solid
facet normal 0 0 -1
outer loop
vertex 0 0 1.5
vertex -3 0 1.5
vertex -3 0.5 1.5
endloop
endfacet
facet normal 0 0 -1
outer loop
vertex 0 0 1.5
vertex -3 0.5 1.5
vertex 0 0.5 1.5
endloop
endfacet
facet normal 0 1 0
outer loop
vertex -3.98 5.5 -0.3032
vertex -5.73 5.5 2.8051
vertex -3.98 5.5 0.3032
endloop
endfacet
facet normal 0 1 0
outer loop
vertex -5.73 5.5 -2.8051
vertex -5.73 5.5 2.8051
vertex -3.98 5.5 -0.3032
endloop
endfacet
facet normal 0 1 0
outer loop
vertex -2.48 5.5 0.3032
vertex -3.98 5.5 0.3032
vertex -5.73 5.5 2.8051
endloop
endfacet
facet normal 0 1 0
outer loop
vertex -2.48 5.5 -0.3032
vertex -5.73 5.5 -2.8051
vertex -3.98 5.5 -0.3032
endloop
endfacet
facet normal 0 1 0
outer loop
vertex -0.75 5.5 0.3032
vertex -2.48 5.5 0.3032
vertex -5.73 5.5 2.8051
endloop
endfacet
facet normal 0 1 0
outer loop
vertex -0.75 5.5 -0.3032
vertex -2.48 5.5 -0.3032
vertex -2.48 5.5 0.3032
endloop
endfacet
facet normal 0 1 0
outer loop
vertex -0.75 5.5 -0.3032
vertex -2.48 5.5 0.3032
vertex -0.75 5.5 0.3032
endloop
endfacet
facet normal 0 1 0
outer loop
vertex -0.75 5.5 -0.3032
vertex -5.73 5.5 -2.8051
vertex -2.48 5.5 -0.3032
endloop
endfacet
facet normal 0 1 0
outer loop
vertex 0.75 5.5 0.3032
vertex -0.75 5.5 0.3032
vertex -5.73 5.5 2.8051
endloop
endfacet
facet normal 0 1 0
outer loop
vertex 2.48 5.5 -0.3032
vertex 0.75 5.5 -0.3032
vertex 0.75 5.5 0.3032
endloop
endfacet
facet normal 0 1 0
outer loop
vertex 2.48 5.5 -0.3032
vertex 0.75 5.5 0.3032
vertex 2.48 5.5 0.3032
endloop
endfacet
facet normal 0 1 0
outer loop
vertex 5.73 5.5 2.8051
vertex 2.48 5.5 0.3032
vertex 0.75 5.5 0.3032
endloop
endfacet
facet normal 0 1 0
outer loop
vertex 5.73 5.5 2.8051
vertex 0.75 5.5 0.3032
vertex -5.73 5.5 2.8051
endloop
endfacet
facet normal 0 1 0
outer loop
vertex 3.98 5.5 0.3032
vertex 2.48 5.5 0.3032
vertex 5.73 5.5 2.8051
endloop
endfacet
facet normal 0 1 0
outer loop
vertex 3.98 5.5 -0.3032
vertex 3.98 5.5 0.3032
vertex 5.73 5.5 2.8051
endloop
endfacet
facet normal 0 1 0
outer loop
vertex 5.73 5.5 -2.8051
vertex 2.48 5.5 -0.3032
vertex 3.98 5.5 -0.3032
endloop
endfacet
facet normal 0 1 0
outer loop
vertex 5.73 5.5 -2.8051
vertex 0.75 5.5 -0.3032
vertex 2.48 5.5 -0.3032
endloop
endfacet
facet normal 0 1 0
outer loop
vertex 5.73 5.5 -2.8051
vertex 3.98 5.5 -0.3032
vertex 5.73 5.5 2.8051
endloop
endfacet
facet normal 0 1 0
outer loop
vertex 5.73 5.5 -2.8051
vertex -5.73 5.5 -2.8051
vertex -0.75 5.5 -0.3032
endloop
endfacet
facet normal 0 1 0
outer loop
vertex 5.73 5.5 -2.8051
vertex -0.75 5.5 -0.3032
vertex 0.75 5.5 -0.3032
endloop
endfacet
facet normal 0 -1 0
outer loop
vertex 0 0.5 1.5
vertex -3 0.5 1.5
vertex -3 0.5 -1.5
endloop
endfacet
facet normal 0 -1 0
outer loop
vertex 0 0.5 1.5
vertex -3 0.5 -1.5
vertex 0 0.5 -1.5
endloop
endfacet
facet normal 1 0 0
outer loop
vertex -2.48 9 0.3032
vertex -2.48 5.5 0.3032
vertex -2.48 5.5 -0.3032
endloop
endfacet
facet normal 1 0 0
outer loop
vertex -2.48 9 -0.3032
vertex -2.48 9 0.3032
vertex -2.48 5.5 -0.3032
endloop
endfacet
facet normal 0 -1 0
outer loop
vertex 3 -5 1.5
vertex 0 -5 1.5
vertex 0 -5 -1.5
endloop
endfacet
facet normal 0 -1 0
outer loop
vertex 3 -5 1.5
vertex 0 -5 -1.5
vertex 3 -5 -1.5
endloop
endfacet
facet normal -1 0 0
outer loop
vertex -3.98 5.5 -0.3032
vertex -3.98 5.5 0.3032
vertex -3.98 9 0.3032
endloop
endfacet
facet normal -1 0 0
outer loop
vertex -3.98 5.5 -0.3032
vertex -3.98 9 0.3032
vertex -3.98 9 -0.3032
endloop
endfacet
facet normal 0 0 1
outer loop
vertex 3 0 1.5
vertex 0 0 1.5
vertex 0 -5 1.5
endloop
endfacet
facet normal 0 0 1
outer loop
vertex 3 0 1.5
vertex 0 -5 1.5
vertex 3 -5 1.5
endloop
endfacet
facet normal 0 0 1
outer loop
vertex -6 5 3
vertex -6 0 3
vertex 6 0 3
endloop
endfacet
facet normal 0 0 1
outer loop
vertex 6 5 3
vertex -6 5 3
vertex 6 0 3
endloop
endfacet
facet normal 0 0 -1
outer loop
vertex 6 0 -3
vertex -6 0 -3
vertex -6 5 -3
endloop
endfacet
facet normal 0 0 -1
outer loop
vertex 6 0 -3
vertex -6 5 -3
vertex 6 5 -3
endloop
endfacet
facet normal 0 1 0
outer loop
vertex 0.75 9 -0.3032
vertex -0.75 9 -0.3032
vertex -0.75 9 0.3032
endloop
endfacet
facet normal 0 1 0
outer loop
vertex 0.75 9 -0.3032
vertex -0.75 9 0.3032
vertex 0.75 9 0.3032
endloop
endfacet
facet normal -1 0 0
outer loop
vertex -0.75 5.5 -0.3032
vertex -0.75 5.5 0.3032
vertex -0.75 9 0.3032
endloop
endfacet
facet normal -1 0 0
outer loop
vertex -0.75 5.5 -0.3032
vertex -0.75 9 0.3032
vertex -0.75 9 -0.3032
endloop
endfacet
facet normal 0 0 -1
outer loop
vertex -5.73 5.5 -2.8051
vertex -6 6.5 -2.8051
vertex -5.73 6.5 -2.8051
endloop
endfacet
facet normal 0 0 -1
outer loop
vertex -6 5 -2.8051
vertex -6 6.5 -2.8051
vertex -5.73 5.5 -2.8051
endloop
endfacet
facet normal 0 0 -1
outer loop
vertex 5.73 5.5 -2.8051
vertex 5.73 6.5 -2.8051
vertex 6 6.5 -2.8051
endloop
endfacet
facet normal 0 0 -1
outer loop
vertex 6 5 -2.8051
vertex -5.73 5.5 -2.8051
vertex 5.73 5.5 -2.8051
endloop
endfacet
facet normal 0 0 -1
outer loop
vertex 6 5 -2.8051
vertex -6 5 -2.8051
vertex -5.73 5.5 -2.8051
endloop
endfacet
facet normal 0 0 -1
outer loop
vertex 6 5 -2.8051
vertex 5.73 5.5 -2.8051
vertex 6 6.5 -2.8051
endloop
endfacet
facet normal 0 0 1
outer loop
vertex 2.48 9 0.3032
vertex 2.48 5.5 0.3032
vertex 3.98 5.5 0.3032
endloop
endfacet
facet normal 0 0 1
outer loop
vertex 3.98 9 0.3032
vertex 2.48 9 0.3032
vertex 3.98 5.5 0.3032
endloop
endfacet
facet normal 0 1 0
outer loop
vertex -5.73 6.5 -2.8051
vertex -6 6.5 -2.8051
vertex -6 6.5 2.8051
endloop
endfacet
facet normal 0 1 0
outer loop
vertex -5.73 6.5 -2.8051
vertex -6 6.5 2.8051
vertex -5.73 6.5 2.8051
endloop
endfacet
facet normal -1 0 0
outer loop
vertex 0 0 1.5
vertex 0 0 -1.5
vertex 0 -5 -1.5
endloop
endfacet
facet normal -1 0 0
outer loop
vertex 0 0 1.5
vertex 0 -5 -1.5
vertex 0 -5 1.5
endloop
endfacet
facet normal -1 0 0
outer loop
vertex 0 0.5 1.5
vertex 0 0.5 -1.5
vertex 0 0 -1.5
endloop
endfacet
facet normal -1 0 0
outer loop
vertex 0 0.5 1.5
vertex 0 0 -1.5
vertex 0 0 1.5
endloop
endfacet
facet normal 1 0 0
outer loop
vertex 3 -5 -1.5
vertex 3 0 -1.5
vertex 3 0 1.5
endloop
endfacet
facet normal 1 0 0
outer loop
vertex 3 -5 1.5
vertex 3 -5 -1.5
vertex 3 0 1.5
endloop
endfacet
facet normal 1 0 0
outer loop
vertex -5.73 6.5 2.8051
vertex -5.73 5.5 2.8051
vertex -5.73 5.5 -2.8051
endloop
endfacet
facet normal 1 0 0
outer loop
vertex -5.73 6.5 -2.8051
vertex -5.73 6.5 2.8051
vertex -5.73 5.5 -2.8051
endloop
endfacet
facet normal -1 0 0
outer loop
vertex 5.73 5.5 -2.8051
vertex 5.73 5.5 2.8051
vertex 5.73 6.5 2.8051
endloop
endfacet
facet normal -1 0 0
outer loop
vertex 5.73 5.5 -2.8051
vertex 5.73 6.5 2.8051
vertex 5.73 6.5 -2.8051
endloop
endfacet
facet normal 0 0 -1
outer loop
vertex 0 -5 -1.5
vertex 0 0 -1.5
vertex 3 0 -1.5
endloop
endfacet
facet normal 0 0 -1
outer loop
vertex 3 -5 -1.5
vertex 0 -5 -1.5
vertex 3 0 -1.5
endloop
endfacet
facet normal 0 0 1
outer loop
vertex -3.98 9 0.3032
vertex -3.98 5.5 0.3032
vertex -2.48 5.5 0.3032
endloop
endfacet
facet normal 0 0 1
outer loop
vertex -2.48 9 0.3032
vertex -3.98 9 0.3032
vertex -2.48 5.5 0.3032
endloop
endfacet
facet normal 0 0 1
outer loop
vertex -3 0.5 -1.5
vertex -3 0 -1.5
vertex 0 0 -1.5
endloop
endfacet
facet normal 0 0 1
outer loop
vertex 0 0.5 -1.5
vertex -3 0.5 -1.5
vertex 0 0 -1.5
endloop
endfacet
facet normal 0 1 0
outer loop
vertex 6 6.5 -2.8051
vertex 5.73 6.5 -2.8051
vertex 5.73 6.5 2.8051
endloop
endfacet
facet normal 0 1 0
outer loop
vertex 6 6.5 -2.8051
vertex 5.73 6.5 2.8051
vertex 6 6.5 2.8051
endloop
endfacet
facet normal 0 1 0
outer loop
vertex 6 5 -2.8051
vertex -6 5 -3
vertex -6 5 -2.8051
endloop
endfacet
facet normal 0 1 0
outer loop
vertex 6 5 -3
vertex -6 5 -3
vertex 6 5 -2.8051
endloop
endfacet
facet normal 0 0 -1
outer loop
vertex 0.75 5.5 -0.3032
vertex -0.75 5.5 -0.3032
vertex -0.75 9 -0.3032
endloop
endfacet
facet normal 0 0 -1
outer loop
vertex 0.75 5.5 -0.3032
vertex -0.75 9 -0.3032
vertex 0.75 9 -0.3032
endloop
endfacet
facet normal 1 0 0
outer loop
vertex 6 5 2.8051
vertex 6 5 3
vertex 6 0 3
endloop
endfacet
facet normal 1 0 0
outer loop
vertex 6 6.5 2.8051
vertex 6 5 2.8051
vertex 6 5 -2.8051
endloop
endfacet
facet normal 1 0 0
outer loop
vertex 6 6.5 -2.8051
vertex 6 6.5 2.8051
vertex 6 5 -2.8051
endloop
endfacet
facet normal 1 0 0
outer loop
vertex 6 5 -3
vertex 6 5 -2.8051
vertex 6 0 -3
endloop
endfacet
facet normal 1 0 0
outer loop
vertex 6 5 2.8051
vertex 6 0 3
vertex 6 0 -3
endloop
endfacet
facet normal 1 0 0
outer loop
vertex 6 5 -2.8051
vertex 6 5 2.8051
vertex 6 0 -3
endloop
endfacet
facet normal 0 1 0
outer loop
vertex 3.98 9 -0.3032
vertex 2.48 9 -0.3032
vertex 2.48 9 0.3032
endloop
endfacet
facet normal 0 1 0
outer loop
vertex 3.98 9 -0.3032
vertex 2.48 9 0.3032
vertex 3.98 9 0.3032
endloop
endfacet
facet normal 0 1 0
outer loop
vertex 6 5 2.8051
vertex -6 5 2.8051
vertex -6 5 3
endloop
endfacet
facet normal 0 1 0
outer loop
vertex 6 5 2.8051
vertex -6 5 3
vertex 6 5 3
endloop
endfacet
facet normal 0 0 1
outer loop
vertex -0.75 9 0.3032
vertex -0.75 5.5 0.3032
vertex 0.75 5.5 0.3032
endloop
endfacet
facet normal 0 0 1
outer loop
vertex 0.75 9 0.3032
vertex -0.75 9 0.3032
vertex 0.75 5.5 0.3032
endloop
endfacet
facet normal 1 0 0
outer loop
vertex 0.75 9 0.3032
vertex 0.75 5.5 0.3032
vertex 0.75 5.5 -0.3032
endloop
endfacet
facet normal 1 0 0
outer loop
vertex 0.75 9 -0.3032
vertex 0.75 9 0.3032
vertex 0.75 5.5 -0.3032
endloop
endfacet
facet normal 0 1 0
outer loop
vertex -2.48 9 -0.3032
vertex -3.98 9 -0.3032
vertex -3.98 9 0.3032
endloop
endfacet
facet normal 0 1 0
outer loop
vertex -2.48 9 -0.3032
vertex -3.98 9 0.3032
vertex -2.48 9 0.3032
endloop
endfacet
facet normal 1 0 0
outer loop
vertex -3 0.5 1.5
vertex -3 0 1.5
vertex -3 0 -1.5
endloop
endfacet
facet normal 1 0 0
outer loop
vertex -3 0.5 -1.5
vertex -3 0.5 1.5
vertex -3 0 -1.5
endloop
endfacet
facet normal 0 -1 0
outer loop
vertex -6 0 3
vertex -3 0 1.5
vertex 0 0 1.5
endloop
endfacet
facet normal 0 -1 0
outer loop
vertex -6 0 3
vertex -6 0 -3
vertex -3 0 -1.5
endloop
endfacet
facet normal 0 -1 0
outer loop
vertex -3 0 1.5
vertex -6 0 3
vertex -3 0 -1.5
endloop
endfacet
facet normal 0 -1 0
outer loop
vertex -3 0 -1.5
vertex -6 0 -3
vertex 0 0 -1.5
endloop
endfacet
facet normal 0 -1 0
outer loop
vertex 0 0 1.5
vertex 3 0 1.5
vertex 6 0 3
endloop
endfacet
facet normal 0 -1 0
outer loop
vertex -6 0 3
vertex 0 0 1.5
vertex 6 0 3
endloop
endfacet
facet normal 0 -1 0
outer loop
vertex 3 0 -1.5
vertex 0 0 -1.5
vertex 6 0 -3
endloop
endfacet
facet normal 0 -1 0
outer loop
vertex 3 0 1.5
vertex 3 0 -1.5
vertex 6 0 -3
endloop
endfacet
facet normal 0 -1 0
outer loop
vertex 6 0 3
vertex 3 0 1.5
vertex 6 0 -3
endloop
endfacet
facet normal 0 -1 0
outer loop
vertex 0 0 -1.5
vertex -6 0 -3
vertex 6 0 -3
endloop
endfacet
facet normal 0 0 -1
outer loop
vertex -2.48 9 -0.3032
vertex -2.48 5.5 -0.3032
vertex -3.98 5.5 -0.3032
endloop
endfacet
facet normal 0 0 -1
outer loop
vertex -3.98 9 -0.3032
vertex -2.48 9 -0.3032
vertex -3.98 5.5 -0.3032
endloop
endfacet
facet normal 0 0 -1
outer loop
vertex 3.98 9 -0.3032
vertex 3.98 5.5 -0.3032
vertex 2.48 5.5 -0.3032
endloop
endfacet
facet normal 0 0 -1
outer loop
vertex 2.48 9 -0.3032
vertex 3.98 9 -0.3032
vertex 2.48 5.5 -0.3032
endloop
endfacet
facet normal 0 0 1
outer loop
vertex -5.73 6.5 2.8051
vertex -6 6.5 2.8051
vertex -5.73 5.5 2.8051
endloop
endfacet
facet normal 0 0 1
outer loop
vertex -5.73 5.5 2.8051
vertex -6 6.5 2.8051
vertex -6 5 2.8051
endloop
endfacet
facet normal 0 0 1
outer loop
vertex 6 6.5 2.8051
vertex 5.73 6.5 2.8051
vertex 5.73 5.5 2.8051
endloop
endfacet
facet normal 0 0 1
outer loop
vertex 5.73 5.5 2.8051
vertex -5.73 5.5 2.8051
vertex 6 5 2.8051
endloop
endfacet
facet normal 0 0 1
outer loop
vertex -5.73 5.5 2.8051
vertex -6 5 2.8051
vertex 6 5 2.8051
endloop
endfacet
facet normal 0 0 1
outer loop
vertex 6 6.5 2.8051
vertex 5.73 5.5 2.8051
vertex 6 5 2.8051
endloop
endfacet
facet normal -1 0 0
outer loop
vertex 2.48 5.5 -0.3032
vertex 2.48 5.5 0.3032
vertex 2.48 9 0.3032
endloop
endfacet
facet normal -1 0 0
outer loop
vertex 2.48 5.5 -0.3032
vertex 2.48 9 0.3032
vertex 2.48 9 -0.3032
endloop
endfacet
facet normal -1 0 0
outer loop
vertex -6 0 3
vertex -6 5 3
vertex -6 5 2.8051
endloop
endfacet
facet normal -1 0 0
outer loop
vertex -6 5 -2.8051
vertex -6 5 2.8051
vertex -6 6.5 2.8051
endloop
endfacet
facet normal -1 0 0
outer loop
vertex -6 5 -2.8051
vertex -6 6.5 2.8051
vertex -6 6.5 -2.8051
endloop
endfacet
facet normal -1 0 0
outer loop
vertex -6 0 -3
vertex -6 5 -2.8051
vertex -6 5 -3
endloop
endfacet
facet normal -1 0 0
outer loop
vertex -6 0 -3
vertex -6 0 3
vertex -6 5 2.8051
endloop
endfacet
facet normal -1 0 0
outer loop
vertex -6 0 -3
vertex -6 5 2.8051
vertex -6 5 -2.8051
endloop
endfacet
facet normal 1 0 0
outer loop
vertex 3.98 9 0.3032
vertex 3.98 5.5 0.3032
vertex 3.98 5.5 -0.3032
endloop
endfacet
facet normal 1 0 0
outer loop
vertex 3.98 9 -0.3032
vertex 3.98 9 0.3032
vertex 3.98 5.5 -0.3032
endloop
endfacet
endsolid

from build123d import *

# Parameters (mm, degrees)
SKETCH_1_W      = 12
SKETCH_1_H      = 6
SKETCH_1_W_2    = 6
SKETCH_1_H_2    = 3
EXTRUDE_1_DEPTH = 5
SKETCH_2_W      = 11.46002803
SKETCH_2_H      = 5.61022278
SKETCH_2_W_2    = 1.5
SKETCH_2_H_2    = 0.606360044
EXTRUDE_2_DEPTH = 0.5
SKETCH_2_3_W    = 0.269985985
SKETCH_2_3_H    = 5.61022278
EXTRUDE_3_DEPTH = 1.5
SKETCH_2_4_W    = 1.5
SKETCH_2_4_H    = 0.606360044
EXTRUDE_4_DEPTH = 4
SKETCH_4_W      = 6
SKETCH_4_H      = 3
EXTRUDE_5_DEPTH = 4.5
SKETCH_6_W      = 3
SKETCH_6_H      = 3
EXTRUDE_6_DEPTH = 5.5


with BuildPart() as part:
    # 草图1 → 凸台-拉伸1 (new body)
    with BuildSketch(Plane(origin=(0, 0, 0), x_dir=(1, 0, 0), z_dir=(0, 1, 0))):
        Rectangle(SKETCH_1_W, SKETCH_1_H)
        Rectangle(SKETCH_1_W_2, SKETCH_1_H_2, mode=Mode.SUBTRACT)
    extrude(amount=EXTRUDE_1_DEPTH)

    # 草图2 → 凸台-拉伸2 (add)
    with BuildSketch(Plane(origin=(0, 5, 0), x_dir=(1, 0, 0), z_dir=(0, 1, 0))):
        Rectangle(SKETCH_2_W, SKETCH_2_H)
        with Locations((3.230014015, 0)):
            Rectangle(SKETCH_2_W_2, SKETCH_2_H_2, mode=Mode.SUBTRACT)
        with Locations((-3.230014015, 0)):
            Rectangle(SKETCH_2_W_2, SKETCH_2_H_2, mode=Mode.SUBTRACT)
        Rectangle(SKETCH_2_W_2, SKETCH_2_H_2, mode=Mode.SUBTRACT)
    extrude(amount=EXTRUDE_2_DEPTH)

    # 草图2<3> → 凸台-拉伸3 (add)
    with BuildSketch(Plane(origin=(0, 5, 0), x_dir=(1, 0, 0), z_dir=(0, 1, 0))):
        with Locations((5.865007008, 0)):
            Rectangle(SKETCH_2_3_W, SKETCH_2_3_H)
        with Locations((-5.865007008, 0)):
            Rectangle(SKETCH_2_3_W, SKETCH_2_3_H)
    extrude(amount=EXTRUDE_3_DEPTH)

    # 草图2<4> → 凸台-拉伸4 (add)
    with BuildSketch(Plane(origin=(0, 5, 0), x_dir=(1, 0, 0), z_dir=(0, 1, 0))):
        with Locations((3.230014015, 0)):
            Rectangle(SKETCH_2_4_W, SKETCH_2_4_H)
        Rectangle(SKETCH_2_4_W, SKETCH_2_4_H)
        with Locations((-3.230014015, 0)):
            Rectangle(SKETCH_2_4_W, SKETCH_2_4_H)
    extrude(amount=EXTRUDE_4_DEPTH)

    # 草图4 → 凸台-拉伸5 (add)
    with BuildSketch(Plane.XZ.offset(-5)):
        Rectangle(SKETCH_4_W, SKETCH_4_H)
    extrude(amount=EXTRUDE_5_DEPTH)

    # 草图6 → 凸台-拉伸6 (add)
    with BuildSketch(Plane.XZ.offset(-0.5)):
        with Locations((1.5, 0)):
            Rectangle(SKETCH_6_W, SKETCH_6_H)
    extrude(amount=EXTRUDE_6_DEPTH)


solid = part.part
